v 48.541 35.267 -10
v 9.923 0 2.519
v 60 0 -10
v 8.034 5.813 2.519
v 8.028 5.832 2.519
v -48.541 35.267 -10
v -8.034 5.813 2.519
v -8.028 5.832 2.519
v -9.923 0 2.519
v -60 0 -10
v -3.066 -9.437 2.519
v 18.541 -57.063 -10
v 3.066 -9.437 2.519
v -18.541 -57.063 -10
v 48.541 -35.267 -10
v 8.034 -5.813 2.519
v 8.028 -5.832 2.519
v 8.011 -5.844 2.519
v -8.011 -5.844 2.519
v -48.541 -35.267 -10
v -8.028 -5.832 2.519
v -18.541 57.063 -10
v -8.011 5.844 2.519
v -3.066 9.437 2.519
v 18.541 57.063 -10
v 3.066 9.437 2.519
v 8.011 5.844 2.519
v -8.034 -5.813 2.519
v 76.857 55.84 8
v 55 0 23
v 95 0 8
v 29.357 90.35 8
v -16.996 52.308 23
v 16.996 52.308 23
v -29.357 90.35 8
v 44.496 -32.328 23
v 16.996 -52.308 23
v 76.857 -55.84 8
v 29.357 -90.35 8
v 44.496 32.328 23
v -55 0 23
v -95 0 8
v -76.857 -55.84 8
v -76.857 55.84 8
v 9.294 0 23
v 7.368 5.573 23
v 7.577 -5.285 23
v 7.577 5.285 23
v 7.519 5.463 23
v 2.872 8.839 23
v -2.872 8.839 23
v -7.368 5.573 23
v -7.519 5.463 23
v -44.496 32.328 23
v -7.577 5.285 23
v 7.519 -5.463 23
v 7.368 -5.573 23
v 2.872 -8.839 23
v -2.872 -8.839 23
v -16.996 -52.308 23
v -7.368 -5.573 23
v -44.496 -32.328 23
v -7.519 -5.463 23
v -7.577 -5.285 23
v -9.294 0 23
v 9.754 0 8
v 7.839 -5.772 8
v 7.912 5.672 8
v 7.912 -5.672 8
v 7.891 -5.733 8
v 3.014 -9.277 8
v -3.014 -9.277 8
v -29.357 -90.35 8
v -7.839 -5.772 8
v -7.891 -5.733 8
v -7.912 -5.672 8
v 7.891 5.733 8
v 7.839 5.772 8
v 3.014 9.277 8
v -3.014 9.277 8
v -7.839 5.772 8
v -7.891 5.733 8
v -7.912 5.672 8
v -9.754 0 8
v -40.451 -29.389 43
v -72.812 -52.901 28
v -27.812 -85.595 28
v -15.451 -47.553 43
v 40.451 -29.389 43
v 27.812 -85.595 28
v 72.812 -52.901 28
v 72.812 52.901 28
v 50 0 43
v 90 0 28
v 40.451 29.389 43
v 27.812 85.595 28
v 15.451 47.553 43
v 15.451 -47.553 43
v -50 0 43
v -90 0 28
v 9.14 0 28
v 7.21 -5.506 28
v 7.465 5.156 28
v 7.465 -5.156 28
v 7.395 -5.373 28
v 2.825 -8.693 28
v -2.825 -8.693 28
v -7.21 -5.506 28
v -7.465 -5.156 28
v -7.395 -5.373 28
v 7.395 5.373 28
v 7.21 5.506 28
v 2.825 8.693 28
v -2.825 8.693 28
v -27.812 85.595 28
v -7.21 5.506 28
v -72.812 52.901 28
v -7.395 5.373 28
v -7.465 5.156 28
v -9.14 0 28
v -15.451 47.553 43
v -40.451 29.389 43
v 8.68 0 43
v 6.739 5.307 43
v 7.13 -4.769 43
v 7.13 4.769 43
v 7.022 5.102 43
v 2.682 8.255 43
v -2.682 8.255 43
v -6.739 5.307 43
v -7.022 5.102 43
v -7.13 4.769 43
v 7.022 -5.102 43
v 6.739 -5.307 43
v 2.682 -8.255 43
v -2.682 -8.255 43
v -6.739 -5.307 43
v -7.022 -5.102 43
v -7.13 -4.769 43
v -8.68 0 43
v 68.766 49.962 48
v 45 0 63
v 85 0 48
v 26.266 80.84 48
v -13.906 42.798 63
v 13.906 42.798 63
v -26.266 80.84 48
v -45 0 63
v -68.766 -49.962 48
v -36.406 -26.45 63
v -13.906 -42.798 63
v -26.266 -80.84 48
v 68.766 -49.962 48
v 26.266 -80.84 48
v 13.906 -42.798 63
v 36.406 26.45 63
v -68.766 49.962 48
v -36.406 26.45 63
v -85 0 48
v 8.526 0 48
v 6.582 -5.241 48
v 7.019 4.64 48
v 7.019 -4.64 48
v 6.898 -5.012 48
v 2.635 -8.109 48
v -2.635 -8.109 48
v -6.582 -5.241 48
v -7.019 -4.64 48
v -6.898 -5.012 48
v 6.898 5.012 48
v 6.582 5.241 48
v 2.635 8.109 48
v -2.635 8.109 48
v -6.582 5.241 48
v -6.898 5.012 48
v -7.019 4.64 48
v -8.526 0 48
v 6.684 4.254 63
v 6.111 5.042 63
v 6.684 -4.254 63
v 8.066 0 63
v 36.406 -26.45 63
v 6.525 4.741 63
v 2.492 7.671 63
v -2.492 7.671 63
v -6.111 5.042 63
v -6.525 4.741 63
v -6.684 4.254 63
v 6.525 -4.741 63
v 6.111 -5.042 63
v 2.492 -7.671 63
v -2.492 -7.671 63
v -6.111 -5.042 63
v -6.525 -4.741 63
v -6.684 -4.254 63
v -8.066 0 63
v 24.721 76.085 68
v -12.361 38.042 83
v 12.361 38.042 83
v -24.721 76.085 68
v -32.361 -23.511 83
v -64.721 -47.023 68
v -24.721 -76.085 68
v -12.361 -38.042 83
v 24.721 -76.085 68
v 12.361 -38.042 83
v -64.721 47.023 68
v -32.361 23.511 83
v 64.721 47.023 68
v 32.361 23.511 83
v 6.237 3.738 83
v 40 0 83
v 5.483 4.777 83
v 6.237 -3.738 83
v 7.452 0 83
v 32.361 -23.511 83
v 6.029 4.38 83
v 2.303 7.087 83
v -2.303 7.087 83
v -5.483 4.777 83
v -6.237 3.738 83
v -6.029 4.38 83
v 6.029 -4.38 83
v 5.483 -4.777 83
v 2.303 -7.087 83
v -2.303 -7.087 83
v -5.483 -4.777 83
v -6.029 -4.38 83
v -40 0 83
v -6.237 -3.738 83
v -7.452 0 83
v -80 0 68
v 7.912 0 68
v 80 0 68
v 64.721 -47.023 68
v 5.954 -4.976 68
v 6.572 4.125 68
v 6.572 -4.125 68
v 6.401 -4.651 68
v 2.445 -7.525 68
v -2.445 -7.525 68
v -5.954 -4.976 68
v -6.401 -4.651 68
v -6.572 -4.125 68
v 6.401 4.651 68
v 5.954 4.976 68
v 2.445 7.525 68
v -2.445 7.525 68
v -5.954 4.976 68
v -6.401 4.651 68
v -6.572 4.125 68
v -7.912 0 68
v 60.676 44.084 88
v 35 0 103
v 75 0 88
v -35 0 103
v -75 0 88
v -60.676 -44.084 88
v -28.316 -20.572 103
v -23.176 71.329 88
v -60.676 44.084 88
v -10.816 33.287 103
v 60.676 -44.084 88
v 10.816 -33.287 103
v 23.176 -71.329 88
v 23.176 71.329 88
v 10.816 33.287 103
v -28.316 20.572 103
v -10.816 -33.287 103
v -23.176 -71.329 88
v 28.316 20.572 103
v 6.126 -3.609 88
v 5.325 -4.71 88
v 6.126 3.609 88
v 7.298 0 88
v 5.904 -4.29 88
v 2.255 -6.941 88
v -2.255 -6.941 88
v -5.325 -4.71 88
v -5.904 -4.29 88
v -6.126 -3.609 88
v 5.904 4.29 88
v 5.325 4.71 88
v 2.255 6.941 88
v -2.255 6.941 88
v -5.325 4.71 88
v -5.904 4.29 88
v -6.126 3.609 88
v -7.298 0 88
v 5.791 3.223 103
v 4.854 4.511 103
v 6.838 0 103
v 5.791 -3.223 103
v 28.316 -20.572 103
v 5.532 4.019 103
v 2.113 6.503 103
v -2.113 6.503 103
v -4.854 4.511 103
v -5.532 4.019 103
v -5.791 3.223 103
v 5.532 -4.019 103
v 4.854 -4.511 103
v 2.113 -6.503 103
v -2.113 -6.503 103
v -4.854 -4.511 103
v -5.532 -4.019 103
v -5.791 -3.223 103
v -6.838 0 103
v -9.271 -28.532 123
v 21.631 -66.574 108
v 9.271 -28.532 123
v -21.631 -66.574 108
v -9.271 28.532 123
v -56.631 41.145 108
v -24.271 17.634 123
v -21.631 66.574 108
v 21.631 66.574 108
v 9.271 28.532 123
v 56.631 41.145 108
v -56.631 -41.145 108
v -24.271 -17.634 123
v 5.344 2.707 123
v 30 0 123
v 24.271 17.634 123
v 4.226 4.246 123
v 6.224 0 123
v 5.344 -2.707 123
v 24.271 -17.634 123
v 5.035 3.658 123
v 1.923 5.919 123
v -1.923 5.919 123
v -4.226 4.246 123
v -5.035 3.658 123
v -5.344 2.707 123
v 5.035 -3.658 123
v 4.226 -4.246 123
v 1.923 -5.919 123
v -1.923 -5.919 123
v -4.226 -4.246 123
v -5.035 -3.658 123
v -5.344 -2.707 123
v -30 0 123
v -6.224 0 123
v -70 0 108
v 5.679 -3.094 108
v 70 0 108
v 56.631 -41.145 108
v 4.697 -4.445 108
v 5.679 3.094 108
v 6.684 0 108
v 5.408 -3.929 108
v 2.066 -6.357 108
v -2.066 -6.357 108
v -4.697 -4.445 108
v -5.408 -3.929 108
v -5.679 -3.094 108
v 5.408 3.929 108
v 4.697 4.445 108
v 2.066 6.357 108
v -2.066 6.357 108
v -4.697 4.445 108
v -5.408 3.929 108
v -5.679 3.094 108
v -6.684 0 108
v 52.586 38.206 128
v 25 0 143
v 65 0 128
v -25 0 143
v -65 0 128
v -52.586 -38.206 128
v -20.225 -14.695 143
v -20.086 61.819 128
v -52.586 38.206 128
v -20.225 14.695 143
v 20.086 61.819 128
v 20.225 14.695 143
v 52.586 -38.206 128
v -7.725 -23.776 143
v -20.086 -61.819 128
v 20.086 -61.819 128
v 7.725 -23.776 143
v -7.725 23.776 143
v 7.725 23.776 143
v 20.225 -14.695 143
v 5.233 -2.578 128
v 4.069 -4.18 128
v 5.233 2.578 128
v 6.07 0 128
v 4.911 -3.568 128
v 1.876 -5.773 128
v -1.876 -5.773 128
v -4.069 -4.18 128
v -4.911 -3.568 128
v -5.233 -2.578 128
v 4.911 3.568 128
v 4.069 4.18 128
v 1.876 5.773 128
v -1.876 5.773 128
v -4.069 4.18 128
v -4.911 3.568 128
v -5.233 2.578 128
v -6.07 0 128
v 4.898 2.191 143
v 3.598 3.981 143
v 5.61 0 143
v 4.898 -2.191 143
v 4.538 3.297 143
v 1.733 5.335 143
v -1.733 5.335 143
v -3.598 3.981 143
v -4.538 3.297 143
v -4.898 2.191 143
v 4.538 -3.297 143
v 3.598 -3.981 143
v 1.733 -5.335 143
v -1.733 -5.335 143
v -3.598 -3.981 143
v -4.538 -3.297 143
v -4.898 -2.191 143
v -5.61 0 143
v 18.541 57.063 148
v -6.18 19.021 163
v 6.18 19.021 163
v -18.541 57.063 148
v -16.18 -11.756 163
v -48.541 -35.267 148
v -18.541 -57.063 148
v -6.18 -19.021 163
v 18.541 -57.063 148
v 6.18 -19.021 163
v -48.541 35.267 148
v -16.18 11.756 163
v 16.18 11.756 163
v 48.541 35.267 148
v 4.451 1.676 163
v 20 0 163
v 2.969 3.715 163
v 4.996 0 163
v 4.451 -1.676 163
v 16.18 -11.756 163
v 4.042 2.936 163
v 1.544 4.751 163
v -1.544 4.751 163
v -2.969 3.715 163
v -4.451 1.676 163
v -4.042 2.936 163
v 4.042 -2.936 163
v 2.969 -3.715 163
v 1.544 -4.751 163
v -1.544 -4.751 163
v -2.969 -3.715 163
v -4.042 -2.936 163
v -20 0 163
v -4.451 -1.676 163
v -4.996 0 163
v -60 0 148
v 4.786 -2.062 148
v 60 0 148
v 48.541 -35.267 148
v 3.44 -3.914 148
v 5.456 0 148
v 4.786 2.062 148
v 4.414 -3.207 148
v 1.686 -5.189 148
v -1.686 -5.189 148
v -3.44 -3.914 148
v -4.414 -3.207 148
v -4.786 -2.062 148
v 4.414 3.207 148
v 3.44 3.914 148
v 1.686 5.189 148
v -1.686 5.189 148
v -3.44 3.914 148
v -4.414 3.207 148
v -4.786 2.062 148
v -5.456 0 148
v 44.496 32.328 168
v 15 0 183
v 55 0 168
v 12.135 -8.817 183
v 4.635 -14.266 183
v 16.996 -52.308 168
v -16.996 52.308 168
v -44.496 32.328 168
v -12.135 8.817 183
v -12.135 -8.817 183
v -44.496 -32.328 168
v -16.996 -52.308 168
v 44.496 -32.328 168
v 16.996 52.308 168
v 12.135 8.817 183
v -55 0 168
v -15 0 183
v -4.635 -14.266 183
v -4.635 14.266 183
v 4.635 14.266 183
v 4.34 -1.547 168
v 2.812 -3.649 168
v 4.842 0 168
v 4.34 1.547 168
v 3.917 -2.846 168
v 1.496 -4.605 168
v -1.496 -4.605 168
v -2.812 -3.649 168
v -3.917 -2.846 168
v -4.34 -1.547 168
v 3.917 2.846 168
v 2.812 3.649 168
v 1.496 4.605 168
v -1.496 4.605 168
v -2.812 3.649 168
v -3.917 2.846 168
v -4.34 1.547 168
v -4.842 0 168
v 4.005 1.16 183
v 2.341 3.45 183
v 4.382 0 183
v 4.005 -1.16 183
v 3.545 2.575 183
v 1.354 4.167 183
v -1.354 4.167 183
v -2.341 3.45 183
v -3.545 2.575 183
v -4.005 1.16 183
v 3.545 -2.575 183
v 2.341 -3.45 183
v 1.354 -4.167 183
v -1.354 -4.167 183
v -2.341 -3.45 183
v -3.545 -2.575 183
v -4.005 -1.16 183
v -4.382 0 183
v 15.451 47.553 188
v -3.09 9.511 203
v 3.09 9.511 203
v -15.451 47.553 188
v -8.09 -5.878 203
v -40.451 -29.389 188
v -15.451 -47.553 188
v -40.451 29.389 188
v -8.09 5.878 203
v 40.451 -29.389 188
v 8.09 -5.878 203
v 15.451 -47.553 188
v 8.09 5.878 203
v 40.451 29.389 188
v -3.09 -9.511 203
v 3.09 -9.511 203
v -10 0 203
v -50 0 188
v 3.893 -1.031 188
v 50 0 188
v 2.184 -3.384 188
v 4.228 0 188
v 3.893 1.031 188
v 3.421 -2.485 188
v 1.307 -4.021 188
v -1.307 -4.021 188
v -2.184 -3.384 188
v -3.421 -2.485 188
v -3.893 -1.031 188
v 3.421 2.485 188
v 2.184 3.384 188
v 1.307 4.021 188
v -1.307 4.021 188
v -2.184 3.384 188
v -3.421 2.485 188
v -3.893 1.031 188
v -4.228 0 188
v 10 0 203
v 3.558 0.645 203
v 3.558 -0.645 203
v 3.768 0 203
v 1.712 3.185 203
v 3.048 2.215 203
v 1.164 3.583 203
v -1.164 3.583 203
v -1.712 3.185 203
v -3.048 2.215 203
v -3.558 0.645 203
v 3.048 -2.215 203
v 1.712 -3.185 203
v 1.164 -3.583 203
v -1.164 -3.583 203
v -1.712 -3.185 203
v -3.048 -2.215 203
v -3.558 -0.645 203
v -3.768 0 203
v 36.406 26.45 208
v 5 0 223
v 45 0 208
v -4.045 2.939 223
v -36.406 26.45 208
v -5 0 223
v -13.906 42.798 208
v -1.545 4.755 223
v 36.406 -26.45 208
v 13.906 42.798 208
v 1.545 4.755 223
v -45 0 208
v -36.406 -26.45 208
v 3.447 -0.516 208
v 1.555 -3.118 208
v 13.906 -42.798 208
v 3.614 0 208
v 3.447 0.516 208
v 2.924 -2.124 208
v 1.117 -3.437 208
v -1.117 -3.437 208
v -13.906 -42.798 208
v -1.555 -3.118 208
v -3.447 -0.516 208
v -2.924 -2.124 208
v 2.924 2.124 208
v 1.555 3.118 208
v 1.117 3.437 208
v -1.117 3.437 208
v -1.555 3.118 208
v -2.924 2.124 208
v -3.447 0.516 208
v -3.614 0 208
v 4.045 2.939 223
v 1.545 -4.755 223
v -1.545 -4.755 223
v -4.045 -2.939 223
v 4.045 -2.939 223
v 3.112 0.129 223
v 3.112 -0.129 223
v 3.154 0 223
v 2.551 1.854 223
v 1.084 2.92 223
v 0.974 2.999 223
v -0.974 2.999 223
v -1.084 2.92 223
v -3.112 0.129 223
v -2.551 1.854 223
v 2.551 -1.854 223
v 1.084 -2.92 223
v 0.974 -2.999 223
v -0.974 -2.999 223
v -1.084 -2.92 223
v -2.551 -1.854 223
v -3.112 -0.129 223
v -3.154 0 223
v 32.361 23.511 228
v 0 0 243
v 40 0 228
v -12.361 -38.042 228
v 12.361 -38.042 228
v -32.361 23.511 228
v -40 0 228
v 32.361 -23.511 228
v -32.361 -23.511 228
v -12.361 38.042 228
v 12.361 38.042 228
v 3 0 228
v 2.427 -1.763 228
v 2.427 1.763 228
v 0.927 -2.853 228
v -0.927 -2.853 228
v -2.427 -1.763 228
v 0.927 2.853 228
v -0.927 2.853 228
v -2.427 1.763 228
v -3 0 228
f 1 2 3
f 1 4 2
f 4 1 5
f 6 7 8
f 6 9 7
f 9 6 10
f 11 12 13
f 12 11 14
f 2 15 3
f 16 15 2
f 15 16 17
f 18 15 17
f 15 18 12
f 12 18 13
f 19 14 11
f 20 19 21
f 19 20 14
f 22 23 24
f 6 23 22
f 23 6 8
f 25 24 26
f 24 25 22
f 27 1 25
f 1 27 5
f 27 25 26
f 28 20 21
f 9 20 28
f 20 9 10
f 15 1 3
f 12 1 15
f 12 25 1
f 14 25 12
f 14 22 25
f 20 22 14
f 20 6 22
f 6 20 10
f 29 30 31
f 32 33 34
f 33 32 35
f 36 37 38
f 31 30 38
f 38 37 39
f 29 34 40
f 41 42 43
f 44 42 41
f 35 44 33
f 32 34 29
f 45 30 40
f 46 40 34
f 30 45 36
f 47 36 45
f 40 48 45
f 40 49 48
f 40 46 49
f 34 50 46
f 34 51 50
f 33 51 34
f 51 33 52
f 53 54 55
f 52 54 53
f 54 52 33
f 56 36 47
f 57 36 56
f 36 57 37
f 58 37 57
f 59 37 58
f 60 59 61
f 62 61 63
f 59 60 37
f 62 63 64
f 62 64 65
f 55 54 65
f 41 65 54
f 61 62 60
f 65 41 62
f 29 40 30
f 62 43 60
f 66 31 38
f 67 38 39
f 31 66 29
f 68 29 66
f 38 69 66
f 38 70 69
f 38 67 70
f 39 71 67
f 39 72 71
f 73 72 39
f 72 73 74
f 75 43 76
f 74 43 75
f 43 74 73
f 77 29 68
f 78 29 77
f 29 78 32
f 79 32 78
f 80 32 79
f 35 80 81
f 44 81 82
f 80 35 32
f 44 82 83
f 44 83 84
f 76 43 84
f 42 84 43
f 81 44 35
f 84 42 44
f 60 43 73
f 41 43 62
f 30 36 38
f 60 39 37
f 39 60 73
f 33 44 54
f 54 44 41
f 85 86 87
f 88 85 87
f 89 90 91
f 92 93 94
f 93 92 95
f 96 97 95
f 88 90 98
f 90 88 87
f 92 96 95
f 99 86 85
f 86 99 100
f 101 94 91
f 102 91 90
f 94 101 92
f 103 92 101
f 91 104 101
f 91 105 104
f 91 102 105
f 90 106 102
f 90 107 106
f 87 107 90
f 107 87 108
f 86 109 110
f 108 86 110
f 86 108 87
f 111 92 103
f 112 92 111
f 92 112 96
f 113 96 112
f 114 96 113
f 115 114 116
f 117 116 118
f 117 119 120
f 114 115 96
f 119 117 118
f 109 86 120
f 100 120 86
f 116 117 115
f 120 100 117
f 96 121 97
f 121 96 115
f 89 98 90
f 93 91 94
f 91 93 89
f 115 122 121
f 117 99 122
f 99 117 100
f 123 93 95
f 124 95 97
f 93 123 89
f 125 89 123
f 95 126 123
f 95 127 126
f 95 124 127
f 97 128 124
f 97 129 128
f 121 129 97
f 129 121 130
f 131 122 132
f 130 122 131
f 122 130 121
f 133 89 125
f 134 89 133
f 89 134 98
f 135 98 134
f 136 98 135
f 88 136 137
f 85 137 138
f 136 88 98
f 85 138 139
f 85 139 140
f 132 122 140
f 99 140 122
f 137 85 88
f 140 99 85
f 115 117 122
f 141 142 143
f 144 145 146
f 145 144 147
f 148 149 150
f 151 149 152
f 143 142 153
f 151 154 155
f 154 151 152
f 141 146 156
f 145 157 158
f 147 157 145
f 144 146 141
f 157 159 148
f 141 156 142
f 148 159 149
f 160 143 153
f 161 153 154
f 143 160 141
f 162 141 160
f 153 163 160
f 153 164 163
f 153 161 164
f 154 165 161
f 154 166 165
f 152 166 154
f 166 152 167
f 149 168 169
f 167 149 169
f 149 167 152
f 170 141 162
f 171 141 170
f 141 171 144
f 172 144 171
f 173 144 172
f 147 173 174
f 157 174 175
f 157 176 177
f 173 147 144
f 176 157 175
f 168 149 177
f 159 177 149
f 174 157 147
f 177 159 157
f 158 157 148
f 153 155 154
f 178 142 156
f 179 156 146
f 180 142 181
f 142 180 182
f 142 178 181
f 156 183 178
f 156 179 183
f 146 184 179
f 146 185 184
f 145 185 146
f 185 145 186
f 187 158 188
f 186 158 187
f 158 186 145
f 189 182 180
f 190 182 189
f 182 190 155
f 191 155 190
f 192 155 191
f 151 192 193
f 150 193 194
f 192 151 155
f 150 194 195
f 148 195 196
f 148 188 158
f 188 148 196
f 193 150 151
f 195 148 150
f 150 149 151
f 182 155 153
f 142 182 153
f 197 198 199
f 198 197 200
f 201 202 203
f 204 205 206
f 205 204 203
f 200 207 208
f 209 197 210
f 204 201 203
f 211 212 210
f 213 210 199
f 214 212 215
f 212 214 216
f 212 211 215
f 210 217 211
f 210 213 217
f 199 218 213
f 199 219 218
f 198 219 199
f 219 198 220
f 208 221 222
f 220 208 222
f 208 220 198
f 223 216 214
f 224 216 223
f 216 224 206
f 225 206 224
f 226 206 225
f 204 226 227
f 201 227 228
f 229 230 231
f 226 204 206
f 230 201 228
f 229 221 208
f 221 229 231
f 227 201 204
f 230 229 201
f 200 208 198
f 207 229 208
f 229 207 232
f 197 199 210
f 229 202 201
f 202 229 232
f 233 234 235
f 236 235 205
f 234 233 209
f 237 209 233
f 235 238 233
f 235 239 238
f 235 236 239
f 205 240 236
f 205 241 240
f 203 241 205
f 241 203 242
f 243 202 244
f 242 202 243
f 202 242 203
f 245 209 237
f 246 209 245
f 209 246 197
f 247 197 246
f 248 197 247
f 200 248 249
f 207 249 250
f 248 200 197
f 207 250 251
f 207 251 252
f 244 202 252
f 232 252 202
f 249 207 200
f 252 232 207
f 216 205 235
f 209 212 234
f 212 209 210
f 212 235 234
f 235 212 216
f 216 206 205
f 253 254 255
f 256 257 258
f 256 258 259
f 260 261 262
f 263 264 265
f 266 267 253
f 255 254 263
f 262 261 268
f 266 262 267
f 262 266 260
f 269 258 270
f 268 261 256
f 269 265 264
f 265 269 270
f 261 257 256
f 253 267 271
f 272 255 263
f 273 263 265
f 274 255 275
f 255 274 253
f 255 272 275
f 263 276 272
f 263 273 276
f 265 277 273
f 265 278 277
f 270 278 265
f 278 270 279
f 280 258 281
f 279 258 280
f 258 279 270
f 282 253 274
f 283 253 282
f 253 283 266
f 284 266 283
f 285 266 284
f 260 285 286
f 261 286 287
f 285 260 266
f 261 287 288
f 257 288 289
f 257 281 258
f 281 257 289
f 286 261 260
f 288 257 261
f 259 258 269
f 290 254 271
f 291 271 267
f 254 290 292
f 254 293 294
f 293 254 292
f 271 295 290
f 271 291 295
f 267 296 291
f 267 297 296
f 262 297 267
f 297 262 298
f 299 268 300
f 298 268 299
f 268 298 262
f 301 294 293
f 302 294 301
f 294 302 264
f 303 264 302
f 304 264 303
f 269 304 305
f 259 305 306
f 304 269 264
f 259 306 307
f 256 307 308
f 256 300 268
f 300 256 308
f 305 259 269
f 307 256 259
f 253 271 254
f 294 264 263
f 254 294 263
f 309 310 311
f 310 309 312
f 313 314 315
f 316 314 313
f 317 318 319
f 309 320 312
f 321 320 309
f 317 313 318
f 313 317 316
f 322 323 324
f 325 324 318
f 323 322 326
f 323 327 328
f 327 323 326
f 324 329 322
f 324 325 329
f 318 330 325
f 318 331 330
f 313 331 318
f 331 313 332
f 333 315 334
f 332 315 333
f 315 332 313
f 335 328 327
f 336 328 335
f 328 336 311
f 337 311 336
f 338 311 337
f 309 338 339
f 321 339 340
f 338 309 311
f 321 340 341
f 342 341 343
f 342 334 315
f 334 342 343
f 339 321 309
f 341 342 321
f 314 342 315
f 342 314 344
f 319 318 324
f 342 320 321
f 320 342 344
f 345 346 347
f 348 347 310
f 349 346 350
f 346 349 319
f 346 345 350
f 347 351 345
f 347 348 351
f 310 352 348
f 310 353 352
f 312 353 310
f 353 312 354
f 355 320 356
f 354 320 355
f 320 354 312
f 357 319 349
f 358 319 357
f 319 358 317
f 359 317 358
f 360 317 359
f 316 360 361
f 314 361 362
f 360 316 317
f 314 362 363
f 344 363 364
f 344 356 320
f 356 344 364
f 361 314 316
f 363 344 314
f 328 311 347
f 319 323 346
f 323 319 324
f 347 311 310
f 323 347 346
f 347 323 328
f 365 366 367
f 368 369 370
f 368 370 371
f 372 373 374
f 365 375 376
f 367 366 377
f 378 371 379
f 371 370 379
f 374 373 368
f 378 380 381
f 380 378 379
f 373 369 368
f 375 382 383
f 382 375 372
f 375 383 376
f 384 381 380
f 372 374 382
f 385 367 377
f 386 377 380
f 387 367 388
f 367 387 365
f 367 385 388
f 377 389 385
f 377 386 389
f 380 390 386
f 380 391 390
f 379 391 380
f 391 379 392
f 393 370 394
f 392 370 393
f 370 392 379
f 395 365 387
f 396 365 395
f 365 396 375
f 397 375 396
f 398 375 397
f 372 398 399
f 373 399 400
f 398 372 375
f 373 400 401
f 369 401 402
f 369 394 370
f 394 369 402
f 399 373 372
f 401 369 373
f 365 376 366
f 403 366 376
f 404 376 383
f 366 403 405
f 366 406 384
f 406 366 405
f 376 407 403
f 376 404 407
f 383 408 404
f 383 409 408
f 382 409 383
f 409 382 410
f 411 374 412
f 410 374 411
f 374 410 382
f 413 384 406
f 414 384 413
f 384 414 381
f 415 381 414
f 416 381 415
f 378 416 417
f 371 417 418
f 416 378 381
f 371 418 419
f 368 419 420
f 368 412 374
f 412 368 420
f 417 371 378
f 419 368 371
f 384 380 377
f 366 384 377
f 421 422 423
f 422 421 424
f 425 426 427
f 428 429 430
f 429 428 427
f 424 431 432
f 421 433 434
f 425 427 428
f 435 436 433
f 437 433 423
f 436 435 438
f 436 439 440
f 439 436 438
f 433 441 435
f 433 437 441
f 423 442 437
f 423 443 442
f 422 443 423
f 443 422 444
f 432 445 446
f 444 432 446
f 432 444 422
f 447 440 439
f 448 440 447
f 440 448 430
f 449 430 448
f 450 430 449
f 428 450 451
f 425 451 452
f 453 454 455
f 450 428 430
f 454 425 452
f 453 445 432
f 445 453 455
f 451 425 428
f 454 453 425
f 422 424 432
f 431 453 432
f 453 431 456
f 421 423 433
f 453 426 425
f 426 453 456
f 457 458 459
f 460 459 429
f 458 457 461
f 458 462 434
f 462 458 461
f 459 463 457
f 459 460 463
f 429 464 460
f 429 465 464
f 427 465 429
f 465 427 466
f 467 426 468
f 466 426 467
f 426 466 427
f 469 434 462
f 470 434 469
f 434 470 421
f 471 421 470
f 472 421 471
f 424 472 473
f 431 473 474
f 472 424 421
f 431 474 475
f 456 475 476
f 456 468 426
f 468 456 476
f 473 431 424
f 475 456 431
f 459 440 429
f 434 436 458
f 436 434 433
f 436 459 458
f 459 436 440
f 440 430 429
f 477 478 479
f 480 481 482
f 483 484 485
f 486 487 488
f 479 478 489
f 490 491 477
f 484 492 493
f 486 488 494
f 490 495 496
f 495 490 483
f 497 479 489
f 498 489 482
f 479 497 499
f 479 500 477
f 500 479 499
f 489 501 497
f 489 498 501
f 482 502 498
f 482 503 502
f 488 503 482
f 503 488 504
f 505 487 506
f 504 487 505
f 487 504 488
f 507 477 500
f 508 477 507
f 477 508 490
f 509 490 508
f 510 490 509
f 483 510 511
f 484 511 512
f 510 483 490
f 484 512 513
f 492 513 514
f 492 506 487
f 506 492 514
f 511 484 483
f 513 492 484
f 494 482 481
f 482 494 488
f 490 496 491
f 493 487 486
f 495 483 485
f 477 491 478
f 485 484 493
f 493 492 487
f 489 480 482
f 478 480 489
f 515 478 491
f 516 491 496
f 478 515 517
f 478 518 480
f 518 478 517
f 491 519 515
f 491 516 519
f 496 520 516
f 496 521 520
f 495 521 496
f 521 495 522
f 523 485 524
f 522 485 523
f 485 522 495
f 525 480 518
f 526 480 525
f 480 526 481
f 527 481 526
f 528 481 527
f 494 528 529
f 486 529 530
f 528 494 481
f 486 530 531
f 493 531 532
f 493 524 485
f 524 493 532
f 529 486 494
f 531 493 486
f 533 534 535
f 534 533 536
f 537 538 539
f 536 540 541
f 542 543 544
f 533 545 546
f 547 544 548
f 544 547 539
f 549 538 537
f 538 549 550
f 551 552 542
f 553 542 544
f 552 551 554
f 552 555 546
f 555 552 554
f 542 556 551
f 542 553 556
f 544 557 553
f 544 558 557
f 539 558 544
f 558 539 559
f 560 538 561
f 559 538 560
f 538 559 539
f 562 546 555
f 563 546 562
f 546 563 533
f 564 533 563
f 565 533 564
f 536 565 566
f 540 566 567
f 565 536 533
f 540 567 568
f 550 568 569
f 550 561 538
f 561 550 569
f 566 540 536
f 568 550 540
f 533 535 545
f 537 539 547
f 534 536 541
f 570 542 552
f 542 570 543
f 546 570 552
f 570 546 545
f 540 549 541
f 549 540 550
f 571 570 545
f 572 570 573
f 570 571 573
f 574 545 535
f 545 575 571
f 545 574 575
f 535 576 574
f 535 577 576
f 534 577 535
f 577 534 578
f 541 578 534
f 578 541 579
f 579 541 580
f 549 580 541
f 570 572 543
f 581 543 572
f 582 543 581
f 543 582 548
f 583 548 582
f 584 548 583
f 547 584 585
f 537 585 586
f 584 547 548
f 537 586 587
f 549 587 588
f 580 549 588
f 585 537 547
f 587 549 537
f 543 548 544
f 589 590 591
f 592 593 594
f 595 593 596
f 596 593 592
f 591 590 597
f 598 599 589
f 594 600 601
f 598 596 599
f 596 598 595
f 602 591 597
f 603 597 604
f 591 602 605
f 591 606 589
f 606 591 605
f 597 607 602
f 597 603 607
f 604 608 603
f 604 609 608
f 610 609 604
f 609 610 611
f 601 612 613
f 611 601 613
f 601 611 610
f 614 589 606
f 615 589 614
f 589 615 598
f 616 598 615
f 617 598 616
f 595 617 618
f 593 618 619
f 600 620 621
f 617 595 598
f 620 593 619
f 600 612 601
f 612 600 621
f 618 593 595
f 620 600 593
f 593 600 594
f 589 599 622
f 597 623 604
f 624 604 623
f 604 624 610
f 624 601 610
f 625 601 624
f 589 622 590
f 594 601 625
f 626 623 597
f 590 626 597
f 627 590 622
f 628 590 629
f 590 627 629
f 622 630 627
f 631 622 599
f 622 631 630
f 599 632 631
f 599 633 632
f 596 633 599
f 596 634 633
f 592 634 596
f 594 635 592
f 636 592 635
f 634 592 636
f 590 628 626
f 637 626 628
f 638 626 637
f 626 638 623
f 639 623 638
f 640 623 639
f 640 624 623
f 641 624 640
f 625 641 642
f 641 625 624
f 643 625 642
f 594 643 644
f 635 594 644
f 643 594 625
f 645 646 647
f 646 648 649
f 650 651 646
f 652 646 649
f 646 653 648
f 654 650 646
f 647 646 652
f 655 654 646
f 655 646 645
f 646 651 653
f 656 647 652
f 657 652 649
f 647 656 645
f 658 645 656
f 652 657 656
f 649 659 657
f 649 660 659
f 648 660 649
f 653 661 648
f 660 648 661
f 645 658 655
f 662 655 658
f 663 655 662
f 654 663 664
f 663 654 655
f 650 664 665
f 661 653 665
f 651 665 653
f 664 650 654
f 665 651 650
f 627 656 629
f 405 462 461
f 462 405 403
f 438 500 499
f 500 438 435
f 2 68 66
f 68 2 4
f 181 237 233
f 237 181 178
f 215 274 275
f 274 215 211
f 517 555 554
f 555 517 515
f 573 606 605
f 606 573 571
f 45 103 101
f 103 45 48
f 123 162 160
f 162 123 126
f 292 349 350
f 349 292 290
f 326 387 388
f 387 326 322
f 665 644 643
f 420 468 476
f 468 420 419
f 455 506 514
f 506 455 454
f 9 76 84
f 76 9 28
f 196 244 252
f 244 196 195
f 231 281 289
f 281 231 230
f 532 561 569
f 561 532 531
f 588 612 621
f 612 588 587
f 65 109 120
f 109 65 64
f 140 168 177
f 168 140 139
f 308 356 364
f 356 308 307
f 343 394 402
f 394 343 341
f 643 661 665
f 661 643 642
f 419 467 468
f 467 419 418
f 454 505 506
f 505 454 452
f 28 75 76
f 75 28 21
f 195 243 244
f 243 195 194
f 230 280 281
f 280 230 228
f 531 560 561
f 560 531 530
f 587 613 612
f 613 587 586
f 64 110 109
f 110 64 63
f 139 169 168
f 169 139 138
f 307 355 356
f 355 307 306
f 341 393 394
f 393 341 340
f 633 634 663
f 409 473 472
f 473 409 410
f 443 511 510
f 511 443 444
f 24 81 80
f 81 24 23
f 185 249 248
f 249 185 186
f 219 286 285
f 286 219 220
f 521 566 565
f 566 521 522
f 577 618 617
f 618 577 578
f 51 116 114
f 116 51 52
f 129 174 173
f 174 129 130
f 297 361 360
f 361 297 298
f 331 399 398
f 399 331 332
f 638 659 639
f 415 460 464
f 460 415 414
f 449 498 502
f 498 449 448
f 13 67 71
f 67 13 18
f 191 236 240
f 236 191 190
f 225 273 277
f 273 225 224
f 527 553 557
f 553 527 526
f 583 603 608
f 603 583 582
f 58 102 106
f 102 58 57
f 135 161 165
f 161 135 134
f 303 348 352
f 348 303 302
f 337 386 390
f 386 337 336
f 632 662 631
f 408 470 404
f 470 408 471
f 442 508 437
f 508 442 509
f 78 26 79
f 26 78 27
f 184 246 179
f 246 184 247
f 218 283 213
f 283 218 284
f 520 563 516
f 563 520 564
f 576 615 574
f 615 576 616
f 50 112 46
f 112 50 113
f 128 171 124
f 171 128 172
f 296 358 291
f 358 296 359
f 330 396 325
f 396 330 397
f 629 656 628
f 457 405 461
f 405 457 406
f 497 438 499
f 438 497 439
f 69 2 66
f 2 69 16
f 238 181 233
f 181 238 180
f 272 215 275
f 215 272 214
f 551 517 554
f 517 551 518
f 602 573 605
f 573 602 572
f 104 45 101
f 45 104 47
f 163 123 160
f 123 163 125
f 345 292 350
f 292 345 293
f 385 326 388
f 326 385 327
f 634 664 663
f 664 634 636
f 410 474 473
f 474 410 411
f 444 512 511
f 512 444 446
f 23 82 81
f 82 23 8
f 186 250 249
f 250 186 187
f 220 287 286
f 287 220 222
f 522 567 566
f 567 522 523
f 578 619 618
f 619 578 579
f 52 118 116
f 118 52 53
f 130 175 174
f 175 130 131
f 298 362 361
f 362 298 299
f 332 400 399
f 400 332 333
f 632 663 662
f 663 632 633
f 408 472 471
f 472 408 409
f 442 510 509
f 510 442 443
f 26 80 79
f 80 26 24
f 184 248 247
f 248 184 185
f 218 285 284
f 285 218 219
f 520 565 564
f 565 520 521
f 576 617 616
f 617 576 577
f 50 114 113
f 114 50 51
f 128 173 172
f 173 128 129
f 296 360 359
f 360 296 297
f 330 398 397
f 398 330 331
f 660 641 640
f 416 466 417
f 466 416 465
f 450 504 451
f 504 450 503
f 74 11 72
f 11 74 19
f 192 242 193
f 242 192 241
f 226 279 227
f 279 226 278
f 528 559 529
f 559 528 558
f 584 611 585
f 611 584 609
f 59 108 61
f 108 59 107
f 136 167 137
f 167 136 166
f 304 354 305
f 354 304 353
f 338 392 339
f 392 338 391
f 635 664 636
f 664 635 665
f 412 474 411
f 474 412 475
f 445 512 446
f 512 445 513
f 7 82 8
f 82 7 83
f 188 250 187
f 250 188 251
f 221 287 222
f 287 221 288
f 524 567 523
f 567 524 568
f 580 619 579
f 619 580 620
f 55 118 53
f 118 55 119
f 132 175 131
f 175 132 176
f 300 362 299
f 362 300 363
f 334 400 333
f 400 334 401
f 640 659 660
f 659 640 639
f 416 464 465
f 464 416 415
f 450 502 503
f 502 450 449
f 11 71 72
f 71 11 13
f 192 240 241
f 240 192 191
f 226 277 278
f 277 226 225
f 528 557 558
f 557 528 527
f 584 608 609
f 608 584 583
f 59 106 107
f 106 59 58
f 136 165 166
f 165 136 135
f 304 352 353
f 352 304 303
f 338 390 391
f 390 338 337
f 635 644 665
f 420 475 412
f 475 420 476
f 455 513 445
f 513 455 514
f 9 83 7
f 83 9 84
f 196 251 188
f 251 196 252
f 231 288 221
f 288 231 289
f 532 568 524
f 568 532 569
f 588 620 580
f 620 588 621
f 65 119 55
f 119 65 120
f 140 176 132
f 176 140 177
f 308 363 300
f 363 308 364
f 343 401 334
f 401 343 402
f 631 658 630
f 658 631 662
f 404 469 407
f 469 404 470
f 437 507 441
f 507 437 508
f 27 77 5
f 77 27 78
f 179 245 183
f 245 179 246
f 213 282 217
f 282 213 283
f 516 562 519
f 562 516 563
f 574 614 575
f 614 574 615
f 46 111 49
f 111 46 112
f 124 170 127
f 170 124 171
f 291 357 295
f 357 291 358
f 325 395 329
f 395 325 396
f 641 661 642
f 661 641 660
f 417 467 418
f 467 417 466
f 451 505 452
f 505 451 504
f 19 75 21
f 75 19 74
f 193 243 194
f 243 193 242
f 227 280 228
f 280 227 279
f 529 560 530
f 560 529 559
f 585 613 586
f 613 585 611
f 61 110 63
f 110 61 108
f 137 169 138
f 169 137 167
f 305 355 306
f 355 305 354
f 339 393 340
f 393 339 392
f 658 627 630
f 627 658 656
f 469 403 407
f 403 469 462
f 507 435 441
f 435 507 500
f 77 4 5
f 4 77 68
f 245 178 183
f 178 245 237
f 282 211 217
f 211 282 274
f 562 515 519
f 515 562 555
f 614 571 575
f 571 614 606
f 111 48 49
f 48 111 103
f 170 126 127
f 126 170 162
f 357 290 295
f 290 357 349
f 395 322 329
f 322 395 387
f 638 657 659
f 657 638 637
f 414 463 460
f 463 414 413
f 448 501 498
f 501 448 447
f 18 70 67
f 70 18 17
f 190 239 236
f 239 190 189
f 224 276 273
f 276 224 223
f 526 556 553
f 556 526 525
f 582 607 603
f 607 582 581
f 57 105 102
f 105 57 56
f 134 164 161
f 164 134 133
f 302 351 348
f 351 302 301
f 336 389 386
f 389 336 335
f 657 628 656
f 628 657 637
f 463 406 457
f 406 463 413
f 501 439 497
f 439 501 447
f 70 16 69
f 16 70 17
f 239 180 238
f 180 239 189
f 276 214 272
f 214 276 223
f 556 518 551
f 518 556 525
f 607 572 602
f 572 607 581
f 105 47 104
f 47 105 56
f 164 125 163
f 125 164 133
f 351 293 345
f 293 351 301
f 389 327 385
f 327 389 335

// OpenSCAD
$fn = 10;
translate([0,0,-10])
cylinder(15,60,0);
translate([0,0,8]) cylinder(15,95,55);
translate([0,0,28]) cylinder(15,90,50);
translate([0,0,48]) cylinder(15,85,45);
translate([0,0,68]) cylinder(15,80,40);
translate([0,0,88]) cylinder(15,75,35);
translate([0,0,108]) cylinder(15,70,30);
translate([0,0,128]) cylinder(15,65,25);
translate([0,0,148]) cylinder(15,60,20);
translate([0,0,168]) cylinder(15,55,15);
translate([0,0,188]) cylinder(15,50,10);
translate([0,0,208]) cylinder(15,45,5);
translate([0,0,228]) cylinder(15,40,0);
cylinder(228,10,3);
